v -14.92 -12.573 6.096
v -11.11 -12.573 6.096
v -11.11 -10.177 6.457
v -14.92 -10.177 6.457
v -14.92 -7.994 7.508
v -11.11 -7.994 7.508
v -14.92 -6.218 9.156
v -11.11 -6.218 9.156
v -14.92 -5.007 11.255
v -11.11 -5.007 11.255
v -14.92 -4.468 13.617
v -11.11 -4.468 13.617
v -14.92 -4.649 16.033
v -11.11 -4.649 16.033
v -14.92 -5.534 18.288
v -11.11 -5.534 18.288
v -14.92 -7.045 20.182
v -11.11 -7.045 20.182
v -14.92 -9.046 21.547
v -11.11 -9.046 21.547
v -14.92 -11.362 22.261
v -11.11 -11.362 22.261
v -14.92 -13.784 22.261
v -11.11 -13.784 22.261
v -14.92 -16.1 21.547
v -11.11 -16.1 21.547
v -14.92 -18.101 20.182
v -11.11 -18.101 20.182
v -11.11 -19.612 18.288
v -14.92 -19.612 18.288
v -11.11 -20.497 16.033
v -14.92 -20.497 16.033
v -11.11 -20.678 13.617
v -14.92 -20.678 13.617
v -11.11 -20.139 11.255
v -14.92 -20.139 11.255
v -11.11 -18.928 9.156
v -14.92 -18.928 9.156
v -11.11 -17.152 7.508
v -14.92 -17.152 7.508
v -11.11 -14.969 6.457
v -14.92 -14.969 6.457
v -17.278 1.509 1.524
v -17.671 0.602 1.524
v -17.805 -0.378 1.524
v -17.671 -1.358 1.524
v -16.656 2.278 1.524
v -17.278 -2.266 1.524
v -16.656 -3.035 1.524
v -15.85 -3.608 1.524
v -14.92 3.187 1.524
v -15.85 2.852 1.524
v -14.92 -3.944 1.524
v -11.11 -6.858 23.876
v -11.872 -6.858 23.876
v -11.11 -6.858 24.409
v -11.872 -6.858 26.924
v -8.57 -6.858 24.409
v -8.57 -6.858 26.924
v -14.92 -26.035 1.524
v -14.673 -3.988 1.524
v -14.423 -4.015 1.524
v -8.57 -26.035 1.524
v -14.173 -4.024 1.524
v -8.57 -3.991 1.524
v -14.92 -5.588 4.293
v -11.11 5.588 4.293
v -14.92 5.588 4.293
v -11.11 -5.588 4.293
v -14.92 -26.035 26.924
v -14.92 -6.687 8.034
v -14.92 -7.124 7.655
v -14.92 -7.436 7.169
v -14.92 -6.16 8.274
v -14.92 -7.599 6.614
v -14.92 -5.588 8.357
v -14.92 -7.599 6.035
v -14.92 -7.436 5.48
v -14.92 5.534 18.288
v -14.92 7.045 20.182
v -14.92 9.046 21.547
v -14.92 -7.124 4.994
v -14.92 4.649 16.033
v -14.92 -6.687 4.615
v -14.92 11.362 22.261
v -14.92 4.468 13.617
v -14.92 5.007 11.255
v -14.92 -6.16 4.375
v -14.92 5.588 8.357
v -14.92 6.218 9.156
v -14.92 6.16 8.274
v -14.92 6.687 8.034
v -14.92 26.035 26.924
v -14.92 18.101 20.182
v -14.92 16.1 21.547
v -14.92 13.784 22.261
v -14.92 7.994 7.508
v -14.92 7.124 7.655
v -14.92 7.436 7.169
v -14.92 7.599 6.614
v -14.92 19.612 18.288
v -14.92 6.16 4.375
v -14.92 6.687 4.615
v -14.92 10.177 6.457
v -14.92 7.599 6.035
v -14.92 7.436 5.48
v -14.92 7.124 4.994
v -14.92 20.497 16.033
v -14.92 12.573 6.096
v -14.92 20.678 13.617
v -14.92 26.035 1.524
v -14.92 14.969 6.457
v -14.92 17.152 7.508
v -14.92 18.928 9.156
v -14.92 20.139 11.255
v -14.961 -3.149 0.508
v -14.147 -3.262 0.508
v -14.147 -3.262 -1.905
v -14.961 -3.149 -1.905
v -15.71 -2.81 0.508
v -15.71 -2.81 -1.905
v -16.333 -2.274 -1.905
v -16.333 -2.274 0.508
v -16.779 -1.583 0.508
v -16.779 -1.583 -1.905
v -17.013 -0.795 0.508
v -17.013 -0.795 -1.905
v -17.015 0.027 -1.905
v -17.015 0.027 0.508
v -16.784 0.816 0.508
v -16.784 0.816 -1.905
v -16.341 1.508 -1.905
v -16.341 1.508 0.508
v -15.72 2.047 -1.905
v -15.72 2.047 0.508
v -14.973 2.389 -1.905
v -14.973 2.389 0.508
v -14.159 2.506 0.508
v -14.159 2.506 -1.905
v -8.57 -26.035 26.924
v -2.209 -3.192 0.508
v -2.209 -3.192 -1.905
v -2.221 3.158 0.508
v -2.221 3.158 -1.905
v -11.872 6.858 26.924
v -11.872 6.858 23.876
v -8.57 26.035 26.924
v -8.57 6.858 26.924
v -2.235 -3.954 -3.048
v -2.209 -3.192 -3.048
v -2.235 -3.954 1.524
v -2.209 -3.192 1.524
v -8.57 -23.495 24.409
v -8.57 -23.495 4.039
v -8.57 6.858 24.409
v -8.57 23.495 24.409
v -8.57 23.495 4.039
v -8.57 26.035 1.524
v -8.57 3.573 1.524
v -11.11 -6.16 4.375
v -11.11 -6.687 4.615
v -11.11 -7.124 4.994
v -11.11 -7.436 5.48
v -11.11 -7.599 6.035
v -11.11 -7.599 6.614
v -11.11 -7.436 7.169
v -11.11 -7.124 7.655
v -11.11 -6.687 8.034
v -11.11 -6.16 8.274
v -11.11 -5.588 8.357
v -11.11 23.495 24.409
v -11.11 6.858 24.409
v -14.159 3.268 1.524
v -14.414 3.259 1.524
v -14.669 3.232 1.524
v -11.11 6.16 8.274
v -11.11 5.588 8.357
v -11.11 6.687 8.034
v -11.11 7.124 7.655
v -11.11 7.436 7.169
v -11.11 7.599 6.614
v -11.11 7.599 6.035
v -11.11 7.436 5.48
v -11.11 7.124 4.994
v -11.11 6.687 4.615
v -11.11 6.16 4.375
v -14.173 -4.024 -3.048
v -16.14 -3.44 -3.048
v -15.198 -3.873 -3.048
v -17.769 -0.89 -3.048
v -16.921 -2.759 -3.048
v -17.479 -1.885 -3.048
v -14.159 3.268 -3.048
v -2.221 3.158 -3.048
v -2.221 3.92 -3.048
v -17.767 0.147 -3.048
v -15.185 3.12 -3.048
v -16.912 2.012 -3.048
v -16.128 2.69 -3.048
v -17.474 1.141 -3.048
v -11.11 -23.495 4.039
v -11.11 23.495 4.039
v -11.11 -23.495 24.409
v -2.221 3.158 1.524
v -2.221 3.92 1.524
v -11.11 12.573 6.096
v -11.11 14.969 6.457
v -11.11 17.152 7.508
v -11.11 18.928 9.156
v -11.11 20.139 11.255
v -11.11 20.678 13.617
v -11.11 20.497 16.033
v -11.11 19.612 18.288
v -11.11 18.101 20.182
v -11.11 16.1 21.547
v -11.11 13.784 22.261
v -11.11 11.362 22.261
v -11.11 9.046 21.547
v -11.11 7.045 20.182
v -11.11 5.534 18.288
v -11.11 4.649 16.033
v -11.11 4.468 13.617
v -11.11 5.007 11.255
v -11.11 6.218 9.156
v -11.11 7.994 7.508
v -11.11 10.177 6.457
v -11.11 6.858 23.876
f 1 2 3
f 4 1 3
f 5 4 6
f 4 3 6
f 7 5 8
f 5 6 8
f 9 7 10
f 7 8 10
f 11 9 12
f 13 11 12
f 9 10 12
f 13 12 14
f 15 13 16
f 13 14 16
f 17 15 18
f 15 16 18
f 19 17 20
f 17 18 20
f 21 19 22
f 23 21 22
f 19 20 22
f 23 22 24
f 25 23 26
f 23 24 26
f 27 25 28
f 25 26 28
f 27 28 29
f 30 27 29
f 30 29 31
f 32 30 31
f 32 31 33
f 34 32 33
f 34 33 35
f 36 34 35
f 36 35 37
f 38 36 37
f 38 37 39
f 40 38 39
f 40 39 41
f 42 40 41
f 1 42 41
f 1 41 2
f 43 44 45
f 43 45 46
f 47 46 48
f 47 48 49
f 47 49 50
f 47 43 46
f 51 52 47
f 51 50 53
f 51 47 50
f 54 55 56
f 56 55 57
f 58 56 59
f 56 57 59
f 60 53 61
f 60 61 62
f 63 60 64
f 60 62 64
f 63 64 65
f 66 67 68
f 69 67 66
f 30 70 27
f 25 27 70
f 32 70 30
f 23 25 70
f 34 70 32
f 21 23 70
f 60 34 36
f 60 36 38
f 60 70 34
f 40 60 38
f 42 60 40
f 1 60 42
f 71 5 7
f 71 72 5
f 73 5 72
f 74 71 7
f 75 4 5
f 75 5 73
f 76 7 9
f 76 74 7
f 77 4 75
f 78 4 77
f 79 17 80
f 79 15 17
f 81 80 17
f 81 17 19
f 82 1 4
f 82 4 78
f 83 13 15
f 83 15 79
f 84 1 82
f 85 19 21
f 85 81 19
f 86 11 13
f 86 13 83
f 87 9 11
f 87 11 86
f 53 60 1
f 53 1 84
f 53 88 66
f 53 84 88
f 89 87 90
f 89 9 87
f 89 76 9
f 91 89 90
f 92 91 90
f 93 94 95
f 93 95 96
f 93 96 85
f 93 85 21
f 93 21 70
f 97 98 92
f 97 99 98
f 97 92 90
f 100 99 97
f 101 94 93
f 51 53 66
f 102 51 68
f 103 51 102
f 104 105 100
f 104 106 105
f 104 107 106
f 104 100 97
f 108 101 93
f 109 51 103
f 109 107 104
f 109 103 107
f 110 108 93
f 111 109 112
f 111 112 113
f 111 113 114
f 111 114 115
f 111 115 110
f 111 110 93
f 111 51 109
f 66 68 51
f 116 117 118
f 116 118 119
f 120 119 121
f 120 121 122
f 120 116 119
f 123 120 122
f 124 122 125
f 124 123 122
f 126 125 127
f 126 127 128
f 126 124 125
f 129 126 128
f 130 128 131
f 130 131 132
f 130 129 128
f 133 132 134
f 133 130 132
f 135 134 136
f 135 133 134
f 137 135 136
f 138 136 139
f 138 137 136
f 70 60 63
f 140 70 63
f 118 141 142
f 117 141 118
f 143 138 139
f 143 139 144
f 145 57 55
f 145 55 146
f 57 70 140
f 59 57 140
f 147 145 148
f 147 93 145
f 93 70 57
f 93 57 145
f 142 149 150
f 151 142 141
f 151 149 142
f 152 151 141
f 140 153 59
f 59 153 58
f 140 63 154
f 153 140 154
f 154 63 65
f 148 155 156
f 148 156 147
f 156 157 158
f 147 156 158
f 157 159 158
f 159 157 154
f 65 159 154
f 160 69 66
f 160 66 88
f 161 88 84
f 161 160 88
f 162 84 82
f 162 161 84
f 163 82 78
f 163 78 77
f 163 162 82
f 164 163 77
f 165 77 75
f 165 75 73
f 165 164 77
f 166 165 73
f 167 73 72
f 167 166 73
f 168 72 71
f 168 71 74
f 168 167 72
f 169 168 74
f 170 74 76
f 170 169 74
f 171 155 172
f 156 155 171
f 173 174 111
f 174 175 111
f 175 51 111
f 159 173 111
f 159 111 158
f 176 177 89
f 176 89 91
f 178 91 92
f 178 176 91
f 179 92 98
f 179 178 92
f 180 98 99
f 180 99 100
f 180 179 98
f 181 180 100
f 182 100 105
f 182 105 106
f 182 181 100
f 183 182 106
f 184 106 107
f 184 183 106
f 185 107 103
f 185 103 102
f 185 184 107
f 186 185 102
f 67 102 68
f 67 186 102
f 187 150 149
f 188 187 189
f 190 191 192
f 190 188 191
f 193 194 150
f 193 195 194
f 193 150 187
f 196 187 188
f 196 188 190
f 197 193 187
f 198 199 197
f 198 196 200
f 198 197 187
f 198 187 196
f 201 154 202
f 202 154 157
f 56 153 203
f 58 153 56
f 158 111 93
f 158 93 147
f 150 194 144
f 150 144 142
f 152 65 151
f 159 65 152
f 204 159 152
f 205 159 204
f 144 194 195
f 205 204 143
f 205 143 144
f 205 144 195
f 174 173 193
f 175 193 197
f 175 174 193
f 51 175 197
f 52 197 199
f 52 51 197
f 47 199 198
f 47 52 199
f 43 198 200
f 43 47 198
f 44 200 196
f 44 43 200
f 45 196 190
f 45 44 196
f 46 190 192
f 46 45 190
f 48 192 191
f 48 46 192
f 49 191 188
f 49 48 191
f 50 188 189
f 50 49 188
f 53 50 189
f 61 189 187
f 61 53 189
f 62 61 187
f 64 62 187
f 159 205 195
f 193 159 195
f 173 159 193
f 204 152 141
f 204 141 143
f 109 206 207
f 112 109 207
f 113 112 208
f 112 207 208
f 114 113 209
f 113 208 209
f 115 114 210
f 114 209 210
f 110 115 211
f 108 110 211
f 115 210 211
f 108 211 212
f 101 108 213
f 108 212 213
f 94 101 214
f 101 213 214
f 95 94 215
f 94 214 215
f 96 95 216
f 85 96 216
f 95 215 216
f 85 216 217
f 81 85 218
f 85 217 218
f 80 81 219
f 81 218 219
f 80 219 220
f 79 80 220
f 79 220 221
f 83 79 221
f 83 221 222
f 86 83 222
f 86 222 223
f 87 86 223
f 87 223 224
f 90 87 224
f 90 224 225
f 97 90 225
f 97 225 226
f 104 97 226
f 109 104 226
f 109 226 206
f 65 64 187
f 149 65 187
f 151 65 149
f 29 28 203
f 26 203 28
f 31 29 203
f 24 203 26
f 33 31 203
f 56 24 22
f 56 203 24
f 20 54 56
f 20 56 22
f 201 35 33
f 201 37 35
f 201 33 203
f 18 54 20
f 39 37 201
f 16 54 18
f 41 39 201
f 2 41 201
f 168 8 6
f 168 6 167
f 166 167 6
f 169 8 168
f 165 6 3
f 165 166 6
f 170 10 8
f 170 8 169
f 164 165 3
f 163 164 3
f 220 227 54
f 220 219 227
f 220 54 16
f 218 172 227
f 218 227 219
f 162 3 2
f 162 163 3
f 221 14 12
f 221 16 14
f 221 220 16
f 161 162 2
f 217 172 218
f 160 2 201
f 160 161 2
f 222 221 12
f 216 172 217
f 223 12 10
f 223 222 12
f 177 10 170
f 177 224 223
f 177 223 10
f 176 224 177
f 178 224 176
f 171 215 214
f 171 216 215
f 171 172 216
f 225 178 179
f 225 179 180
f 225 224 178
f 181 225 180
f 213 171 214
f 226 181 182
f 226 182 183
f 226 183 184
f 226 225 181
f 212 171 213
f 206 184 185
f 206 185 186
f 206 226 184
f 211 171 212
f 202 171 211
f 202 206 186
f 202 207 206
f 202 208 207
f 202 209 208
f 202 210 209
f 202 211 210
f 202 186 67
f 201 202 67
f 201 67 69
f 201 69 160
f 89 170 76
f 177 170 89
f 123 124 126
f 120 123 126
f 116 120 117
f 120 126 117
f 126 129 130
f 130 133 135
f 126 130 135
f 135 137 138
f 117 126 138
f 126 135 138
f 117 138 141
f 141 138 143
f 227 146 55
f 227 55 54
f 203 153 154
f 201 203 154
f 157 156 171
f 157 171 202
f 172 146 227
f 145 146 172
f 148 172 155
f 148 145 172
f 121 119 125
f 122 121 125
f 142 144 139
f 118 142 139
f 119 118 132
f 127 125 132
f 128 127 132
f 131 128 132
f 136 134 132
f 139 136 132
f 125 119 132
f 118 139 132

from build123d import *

# Parameters (mm, degrees)
BOSS_EXTRUDE1_DEPTH      = 1.524
BOSS_EXTRUDE1_DEPTH_BACK = 3.048
BOSS_EXTRUDE2_DEPTH      = 1.016
BOSS_EXTRUDE3_DEPTH      = 1.143
SKETCH4_W                = 6.35
SKETCH4_H                = 52.07
BOSS_EXTRUDE4_DEPTH      = 25.4
SKETCH5_W                = 20.3708
SKETCH5_H                = 46.99
CUT_EXTRUDE1_DEPTH       = 2.54
SKETCH6_R                = 8.128
CUT_EXTRUDE2_DEPTH       = 7.695152554
SKETCH7_W                = 3.302
SKETCH7_H                = 13.716
CUT_EXTRUDE3_DEPTH       = 3.048
CUT_EXTRUDE4_DEPTH       = 3.81


with BuildPart() as part:
    # Sketch1 → Boss-Extrude1 (new body, two sides)
    with BuildSketch(Plane.XY) as boss_extrude1_sk:
        with BuildLine():
            Line((-2.221121967, 3.920099398), (-14.159121967, 3.267778706))
            ThreePointArc((-14.159121967, 3.267778706), (-17.805238677, -0.371570093), (-14.172670351, -4.024442128))
            Line((-14.172670351, -4.024442128), (-2.234670351, -3.953900602))
            Line((-2.234670351, -3.953900602), (-2.209072203, -3.191900602))
            Line((-2.209072203, -3.191900602), (-14.147072203, -3.262442128))
            ThreePointArc((-14.147072203, -3.262442128), (-17.043238677, -0.384369192), (-14.159121967, 2.505778706))
            Line((-14.159121967, 2.505778706), (-2.221121967, 3.158099398))
            Line((-2.221121967, 3.158099398), (-2.221121967, 3.920099398))
        make_face()
    extrude(amount=BOSS_EXTRUDE1_DEPTH)
    extrude(boss_extrude1_sk.sketch, amount=-BOSS_EXTRUDE1_DEPTH_BACK)

    # Sketch2 → Boss-Extrude2 (add)
    with BuildSketch(Plane.XY.offset(1.524)):
        with BuildLine():
            Line((-2.209072203, -3.191900602), (-2.221121967, 3.158099398))
            Line((-2.221121967, 3.158099398), (-14.159121967, 2.505778706))
            ThreePointArc((-14.159121967, 2.505778706), (-17.043238677, -0.384369192), (-14.147072203, -3.262442128))
            Line((-14.147072203, -3.262442128), (-2.209072203, -3.191900602))
        make_face()
    extrude(amount=-BOSS_EXTRUDE2_DEPTH)

    # Sketch3 → Boss-Extrude3 (add)
    with BuildSketch(Plane(origin=(0, 0, -3.048), x_dir=(-1, 0, 0), z_dir=(0, 0, -1))):
        with BuildLine():
            Line((14.159121967, 2.505778706), (2.221121967, 3.158099398))
            Line((2.221121967, 3.158099398), (2.209072203, -3.191900602))
            Line((2.209072203, -3.191900602), (14.147072203, -3.262442128))
            ThreePointArc((14.147072203, -3.262442128), (17.043238677, -0.384369192), (14.159121967, 2.505778706))
        make_face()
    extrude(amount=-BOSS_EXTRUDE3_DEPTH)

    # Sketch4 → Boss-Extrude4 (add)
    with BuildSketch(Plane.XY.offset(1.524)):
        with Locations((-11.745092416, 0)):
            Rectangle(SKETCH4_W, SKETCH4_H)
    extrude(amount=BOSS_EXTRUDE4_DEPTH)

    # Sketch5 → Cut-Extrude1 (cut)
    with BuildSketch(Plane(origin=(-8.570092416, 0, 0), x_dir=(0, 0, -1), z_dir=(1, 0, 0))):
        with Locations((-14.224, 0)):
            Rectangle(SKETCH5_W, SKETCH5_H)
    extrude(amount=-CUT_EXTRUDE1_DEPTH, mode=Mode.SUBTRACT)

    # Sketch6 → Cut-Extrude2 (cut, through all)
    with BuildSketch(Plane(origin=(-11.110092416, 0, 0), x_dir=(0, 0, -1), z_dir=(1, 0, 0))):
        with Locations((-14.224, -12.573)):
            Circle(SKETCH6_R)
        with Locations((-14.224, 12.573)):
            Circle(SKETCH6_R)
    extrude(amount=-CUT_EXTRUDE2_DEPTH, mode=Mode.SUBTRACT)

    # Sketch7 → Cut-Extrude3 (cut)
    with BuildSketch(Plane.XY.offset(26.924)):
        with Locations((-10.221092416, 0)):
            Rectangle(SKETCH7_W, SKETCH7_H)
    extrude(amount=-CUT_EXTRUDE3_DEPTH, mode=Mode.SUBTRACT)

    # Sketch8 → Cut-Extrude4 (cut)
    with BuildSketch(Plane(origin=(-11.110092416, 0, 0), x_dir=(0, 0, -1), z_dir=(1, 0, 0))):
        with BuildLine():
            Line((-8.3566, -5.588), (-8.3566, 5.588))
            ThreePointArc((-8.3566, 5.588), (-6.3246, 7.62), (-4.2926, 5.588))
            Line((-4.2926, 5.588), (-4.2926, -5.588))
            ThreePointArc((-4.2926, -5.588), (-6.3246, -7.62), (-8.3566, -5.588))
        make_face()
    extrude(amount=-CUT_EXTRUDE4_DEPTH, mode=Mode.SUBTRACT)


solid = part.part
